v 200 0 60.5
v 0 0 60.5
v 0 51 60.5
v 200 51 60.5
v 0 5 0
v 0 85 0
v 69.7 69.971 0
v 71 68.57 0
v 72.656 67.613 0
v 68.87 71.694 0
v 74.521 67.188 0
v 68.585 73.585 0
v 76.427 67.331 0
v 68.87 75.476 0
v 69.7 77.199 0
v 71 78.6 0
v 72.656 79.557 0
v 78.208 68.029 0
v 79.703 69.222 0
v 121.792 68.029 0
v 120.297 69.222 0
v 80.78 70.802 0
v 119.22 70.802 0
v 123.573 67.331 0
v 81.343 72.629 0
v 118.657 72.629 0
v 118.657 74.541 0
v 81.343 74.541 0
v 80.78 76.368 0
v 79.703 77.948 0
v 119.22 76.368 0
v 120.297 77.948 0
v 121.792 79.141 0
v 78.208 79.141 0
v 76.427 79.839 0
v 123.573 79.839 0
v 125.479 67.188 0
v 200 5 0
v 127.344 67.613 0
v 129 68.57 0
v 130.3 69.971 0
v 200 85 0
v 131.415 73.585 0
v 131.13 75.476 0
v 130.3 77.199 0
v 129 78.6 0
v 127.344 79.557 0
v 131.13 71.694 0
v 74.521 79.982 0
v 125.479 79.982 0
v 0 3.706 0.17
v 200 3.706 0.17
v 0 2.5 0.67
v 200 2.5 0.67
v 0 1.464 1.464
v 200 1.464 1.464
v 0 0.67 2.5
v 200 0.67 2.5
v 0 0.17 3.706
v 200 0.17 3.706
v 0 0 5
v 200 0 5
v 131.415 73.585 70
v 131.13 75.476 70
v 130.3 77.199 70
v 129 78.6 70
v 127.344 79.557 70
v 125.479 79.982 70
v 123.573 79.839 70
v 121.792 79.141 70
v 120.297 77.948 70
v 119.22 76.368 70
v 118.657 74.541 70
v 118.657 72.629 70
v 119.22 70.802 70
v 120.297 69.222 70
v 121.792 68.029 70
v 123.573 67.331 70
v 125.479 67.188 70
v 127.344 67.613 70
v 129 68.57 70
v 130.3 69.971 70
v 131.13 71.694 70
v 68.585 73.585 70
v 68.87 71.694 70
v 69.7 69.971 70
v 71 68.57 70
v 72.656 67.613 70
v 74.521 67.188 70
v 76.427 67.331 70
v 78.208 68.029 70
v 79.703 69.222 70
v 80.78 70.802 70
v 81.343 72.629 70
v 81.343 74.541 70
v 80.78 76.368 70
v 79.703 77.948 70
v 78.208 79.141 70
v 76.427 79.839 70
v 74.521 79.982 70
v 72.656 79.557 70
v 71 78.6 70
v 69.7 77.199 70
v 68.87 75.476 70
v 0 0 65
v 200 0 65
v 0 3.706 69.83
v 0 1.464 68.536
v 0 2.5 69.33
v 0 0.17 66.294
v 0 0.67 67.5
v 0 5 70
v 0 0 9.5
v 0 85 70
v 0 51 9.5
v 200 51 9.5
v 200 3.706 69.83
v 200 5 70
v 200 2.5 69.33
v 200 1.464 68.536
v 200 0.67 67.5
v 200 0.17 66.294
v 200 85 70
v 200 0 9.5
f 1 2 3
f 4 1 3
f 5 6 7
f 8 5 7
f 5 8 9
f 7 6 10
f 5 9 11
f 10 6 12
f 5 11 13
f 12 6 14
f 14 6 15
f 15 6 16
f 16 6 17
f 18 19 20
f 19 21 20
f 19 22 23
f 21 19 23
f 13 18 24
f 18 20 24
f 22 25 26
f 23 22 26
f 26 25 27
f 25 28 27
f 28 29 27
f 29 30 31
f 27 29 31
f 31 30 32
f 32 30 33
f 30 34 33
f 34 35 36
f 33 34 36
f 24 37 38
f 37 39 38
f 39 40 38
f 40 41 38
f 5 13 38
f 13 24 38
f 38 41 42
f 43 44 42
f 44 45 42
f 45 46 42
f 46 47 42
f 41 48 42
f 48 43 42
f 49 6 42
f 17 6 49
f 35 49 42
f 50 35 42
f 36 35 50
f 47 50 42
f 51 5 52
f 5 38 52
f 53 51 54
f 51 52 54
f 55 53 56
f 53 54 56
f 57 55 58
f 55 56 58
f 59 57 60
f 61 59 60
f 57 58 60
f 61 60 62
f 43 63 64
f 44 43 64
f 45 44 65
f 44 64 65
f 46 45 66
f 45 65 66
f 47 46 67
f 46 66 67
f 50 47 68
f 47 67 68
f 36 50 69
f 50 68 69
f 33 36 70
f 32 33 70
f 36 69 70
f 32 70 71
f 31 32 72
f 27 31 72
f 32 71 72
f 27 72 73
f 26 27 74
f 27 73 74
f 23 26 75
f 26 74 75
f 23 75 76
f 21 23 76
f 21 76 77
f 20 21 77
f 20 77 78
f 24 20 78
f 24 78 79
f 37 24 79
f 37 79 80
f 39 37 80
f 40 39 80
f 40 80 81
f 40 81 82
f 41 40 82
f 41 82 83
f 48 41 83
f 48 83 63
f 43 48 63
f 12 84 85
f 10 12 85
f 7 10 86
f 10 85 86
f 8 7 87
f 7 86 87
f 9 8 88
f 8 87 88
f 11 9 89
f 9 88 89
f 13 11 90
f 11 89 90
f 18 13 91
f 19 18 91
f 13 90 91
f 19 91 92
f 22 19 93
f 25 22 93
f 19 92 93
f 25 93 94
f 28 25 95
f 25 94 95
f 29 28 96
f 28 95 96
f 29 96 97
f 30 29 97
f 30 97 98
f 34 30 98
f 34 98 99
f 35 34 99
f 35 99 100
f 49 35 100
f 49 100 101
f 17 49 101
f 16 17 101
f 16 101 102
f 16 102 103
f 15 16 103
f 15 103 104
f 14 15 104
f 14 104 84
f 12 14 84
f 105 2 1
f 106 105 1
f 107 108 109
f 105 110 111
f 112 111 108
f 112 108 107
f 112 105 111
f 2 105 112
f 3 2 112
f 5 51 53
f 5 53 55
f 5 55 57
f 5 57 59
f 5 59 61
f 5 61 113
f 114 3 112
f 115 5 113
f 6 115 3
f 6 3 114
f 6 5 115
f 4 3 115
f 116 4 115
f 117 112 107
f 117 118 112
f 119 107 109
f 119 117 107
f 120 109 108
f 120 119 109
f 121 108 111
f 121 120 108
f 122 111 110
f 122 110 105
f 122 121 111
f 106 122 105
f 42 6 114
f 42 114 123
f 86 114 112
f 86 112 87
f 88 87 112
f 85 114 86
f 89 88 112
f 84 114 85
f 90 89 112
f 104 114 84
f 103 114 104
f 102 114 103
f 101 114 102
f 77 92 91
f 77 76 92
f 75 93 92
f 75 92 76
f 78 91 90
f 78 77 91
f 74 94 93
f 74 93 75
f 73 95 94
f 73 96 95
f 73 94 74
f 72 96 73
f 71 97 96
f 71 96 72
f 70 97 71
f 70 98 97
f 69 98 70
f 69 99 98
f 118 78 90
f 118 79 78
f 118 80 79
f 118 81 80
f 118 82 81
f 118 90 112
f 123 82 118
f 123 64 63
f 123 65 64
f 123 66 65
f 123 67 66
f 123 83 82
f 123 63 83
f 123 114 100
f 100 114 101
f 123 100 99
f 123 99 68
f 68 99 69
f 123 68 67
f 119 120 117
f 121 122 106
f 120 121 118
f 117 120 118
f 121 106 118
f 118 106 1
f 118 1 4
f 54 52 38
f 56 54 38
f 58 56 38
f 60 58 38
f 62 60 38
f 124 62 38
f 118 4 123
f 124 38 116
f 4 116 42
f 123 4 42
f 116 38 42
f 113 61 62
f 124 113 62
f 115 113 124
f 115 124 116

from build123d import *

# Parameters (mm, degrees)
SKETCH2_W           = 200
SKETCH2_H           = 85
BOSS_EXTRUDE1_DEPTH = 70
SKETCH3_W           = 51
SKETCH3_H           = 51
CUT_EXTRUDE1_DEPTH  = 229.309001137
FILLET1_R           = 5
SKETCH4_R           = 6.415
CUT_EXTRUDE2_DEPTH  = 229.309001137


with BuildPart() as part:
    # Sketch2 → Boss-Extrude1 (new body)
    with BuildSketch(Plane.XY):
        with Locations((100, 42.5)):
            Rectangle(SKETCH2_W, SKETCH2_H)
    extrude(amount=BOSS_EXTRUDE1_DEPTH)

    # Sketch3 → Cut-Extrude1 (cut, through all)
    with BuildSketch(Plane(origin=(200, 0, 0), x_dir=(0, 0, -1), z_dir=(1, 0, 0))):
        with Locations((-35, 25.5)):
            Rectangle(SKETCH3_W, SKETCH3_H)
    extrude(amount=-CUT_EXTRUDE1_DEPTH, mode=Mode.SUBTRACT)

    # Fillet1
    fillet1_edges = [part.edges().sort_by_distance(p)[0] for p in [
        (100, 0, 0),
        (100, 0, 70),
    ]]
    fillet(fillet1_edges, radius=FILLET1_R)

    # Sketch4 → Cut-Extrude2 (cut, through all)
    with BuildSketch(Plane.XY.offset(70)):
        with Locations((125, 73.585)):
            Circle(SKETCH4_R)
        with Locations(Location((75, 73.585, 0), (0, 0, 180))):
            Circle(SKETCH4_R)
    extrude(amount=-CUT_EXTRUDE2_DEPTH, mode=Mode.SUBTRACT)


solid = part.part
